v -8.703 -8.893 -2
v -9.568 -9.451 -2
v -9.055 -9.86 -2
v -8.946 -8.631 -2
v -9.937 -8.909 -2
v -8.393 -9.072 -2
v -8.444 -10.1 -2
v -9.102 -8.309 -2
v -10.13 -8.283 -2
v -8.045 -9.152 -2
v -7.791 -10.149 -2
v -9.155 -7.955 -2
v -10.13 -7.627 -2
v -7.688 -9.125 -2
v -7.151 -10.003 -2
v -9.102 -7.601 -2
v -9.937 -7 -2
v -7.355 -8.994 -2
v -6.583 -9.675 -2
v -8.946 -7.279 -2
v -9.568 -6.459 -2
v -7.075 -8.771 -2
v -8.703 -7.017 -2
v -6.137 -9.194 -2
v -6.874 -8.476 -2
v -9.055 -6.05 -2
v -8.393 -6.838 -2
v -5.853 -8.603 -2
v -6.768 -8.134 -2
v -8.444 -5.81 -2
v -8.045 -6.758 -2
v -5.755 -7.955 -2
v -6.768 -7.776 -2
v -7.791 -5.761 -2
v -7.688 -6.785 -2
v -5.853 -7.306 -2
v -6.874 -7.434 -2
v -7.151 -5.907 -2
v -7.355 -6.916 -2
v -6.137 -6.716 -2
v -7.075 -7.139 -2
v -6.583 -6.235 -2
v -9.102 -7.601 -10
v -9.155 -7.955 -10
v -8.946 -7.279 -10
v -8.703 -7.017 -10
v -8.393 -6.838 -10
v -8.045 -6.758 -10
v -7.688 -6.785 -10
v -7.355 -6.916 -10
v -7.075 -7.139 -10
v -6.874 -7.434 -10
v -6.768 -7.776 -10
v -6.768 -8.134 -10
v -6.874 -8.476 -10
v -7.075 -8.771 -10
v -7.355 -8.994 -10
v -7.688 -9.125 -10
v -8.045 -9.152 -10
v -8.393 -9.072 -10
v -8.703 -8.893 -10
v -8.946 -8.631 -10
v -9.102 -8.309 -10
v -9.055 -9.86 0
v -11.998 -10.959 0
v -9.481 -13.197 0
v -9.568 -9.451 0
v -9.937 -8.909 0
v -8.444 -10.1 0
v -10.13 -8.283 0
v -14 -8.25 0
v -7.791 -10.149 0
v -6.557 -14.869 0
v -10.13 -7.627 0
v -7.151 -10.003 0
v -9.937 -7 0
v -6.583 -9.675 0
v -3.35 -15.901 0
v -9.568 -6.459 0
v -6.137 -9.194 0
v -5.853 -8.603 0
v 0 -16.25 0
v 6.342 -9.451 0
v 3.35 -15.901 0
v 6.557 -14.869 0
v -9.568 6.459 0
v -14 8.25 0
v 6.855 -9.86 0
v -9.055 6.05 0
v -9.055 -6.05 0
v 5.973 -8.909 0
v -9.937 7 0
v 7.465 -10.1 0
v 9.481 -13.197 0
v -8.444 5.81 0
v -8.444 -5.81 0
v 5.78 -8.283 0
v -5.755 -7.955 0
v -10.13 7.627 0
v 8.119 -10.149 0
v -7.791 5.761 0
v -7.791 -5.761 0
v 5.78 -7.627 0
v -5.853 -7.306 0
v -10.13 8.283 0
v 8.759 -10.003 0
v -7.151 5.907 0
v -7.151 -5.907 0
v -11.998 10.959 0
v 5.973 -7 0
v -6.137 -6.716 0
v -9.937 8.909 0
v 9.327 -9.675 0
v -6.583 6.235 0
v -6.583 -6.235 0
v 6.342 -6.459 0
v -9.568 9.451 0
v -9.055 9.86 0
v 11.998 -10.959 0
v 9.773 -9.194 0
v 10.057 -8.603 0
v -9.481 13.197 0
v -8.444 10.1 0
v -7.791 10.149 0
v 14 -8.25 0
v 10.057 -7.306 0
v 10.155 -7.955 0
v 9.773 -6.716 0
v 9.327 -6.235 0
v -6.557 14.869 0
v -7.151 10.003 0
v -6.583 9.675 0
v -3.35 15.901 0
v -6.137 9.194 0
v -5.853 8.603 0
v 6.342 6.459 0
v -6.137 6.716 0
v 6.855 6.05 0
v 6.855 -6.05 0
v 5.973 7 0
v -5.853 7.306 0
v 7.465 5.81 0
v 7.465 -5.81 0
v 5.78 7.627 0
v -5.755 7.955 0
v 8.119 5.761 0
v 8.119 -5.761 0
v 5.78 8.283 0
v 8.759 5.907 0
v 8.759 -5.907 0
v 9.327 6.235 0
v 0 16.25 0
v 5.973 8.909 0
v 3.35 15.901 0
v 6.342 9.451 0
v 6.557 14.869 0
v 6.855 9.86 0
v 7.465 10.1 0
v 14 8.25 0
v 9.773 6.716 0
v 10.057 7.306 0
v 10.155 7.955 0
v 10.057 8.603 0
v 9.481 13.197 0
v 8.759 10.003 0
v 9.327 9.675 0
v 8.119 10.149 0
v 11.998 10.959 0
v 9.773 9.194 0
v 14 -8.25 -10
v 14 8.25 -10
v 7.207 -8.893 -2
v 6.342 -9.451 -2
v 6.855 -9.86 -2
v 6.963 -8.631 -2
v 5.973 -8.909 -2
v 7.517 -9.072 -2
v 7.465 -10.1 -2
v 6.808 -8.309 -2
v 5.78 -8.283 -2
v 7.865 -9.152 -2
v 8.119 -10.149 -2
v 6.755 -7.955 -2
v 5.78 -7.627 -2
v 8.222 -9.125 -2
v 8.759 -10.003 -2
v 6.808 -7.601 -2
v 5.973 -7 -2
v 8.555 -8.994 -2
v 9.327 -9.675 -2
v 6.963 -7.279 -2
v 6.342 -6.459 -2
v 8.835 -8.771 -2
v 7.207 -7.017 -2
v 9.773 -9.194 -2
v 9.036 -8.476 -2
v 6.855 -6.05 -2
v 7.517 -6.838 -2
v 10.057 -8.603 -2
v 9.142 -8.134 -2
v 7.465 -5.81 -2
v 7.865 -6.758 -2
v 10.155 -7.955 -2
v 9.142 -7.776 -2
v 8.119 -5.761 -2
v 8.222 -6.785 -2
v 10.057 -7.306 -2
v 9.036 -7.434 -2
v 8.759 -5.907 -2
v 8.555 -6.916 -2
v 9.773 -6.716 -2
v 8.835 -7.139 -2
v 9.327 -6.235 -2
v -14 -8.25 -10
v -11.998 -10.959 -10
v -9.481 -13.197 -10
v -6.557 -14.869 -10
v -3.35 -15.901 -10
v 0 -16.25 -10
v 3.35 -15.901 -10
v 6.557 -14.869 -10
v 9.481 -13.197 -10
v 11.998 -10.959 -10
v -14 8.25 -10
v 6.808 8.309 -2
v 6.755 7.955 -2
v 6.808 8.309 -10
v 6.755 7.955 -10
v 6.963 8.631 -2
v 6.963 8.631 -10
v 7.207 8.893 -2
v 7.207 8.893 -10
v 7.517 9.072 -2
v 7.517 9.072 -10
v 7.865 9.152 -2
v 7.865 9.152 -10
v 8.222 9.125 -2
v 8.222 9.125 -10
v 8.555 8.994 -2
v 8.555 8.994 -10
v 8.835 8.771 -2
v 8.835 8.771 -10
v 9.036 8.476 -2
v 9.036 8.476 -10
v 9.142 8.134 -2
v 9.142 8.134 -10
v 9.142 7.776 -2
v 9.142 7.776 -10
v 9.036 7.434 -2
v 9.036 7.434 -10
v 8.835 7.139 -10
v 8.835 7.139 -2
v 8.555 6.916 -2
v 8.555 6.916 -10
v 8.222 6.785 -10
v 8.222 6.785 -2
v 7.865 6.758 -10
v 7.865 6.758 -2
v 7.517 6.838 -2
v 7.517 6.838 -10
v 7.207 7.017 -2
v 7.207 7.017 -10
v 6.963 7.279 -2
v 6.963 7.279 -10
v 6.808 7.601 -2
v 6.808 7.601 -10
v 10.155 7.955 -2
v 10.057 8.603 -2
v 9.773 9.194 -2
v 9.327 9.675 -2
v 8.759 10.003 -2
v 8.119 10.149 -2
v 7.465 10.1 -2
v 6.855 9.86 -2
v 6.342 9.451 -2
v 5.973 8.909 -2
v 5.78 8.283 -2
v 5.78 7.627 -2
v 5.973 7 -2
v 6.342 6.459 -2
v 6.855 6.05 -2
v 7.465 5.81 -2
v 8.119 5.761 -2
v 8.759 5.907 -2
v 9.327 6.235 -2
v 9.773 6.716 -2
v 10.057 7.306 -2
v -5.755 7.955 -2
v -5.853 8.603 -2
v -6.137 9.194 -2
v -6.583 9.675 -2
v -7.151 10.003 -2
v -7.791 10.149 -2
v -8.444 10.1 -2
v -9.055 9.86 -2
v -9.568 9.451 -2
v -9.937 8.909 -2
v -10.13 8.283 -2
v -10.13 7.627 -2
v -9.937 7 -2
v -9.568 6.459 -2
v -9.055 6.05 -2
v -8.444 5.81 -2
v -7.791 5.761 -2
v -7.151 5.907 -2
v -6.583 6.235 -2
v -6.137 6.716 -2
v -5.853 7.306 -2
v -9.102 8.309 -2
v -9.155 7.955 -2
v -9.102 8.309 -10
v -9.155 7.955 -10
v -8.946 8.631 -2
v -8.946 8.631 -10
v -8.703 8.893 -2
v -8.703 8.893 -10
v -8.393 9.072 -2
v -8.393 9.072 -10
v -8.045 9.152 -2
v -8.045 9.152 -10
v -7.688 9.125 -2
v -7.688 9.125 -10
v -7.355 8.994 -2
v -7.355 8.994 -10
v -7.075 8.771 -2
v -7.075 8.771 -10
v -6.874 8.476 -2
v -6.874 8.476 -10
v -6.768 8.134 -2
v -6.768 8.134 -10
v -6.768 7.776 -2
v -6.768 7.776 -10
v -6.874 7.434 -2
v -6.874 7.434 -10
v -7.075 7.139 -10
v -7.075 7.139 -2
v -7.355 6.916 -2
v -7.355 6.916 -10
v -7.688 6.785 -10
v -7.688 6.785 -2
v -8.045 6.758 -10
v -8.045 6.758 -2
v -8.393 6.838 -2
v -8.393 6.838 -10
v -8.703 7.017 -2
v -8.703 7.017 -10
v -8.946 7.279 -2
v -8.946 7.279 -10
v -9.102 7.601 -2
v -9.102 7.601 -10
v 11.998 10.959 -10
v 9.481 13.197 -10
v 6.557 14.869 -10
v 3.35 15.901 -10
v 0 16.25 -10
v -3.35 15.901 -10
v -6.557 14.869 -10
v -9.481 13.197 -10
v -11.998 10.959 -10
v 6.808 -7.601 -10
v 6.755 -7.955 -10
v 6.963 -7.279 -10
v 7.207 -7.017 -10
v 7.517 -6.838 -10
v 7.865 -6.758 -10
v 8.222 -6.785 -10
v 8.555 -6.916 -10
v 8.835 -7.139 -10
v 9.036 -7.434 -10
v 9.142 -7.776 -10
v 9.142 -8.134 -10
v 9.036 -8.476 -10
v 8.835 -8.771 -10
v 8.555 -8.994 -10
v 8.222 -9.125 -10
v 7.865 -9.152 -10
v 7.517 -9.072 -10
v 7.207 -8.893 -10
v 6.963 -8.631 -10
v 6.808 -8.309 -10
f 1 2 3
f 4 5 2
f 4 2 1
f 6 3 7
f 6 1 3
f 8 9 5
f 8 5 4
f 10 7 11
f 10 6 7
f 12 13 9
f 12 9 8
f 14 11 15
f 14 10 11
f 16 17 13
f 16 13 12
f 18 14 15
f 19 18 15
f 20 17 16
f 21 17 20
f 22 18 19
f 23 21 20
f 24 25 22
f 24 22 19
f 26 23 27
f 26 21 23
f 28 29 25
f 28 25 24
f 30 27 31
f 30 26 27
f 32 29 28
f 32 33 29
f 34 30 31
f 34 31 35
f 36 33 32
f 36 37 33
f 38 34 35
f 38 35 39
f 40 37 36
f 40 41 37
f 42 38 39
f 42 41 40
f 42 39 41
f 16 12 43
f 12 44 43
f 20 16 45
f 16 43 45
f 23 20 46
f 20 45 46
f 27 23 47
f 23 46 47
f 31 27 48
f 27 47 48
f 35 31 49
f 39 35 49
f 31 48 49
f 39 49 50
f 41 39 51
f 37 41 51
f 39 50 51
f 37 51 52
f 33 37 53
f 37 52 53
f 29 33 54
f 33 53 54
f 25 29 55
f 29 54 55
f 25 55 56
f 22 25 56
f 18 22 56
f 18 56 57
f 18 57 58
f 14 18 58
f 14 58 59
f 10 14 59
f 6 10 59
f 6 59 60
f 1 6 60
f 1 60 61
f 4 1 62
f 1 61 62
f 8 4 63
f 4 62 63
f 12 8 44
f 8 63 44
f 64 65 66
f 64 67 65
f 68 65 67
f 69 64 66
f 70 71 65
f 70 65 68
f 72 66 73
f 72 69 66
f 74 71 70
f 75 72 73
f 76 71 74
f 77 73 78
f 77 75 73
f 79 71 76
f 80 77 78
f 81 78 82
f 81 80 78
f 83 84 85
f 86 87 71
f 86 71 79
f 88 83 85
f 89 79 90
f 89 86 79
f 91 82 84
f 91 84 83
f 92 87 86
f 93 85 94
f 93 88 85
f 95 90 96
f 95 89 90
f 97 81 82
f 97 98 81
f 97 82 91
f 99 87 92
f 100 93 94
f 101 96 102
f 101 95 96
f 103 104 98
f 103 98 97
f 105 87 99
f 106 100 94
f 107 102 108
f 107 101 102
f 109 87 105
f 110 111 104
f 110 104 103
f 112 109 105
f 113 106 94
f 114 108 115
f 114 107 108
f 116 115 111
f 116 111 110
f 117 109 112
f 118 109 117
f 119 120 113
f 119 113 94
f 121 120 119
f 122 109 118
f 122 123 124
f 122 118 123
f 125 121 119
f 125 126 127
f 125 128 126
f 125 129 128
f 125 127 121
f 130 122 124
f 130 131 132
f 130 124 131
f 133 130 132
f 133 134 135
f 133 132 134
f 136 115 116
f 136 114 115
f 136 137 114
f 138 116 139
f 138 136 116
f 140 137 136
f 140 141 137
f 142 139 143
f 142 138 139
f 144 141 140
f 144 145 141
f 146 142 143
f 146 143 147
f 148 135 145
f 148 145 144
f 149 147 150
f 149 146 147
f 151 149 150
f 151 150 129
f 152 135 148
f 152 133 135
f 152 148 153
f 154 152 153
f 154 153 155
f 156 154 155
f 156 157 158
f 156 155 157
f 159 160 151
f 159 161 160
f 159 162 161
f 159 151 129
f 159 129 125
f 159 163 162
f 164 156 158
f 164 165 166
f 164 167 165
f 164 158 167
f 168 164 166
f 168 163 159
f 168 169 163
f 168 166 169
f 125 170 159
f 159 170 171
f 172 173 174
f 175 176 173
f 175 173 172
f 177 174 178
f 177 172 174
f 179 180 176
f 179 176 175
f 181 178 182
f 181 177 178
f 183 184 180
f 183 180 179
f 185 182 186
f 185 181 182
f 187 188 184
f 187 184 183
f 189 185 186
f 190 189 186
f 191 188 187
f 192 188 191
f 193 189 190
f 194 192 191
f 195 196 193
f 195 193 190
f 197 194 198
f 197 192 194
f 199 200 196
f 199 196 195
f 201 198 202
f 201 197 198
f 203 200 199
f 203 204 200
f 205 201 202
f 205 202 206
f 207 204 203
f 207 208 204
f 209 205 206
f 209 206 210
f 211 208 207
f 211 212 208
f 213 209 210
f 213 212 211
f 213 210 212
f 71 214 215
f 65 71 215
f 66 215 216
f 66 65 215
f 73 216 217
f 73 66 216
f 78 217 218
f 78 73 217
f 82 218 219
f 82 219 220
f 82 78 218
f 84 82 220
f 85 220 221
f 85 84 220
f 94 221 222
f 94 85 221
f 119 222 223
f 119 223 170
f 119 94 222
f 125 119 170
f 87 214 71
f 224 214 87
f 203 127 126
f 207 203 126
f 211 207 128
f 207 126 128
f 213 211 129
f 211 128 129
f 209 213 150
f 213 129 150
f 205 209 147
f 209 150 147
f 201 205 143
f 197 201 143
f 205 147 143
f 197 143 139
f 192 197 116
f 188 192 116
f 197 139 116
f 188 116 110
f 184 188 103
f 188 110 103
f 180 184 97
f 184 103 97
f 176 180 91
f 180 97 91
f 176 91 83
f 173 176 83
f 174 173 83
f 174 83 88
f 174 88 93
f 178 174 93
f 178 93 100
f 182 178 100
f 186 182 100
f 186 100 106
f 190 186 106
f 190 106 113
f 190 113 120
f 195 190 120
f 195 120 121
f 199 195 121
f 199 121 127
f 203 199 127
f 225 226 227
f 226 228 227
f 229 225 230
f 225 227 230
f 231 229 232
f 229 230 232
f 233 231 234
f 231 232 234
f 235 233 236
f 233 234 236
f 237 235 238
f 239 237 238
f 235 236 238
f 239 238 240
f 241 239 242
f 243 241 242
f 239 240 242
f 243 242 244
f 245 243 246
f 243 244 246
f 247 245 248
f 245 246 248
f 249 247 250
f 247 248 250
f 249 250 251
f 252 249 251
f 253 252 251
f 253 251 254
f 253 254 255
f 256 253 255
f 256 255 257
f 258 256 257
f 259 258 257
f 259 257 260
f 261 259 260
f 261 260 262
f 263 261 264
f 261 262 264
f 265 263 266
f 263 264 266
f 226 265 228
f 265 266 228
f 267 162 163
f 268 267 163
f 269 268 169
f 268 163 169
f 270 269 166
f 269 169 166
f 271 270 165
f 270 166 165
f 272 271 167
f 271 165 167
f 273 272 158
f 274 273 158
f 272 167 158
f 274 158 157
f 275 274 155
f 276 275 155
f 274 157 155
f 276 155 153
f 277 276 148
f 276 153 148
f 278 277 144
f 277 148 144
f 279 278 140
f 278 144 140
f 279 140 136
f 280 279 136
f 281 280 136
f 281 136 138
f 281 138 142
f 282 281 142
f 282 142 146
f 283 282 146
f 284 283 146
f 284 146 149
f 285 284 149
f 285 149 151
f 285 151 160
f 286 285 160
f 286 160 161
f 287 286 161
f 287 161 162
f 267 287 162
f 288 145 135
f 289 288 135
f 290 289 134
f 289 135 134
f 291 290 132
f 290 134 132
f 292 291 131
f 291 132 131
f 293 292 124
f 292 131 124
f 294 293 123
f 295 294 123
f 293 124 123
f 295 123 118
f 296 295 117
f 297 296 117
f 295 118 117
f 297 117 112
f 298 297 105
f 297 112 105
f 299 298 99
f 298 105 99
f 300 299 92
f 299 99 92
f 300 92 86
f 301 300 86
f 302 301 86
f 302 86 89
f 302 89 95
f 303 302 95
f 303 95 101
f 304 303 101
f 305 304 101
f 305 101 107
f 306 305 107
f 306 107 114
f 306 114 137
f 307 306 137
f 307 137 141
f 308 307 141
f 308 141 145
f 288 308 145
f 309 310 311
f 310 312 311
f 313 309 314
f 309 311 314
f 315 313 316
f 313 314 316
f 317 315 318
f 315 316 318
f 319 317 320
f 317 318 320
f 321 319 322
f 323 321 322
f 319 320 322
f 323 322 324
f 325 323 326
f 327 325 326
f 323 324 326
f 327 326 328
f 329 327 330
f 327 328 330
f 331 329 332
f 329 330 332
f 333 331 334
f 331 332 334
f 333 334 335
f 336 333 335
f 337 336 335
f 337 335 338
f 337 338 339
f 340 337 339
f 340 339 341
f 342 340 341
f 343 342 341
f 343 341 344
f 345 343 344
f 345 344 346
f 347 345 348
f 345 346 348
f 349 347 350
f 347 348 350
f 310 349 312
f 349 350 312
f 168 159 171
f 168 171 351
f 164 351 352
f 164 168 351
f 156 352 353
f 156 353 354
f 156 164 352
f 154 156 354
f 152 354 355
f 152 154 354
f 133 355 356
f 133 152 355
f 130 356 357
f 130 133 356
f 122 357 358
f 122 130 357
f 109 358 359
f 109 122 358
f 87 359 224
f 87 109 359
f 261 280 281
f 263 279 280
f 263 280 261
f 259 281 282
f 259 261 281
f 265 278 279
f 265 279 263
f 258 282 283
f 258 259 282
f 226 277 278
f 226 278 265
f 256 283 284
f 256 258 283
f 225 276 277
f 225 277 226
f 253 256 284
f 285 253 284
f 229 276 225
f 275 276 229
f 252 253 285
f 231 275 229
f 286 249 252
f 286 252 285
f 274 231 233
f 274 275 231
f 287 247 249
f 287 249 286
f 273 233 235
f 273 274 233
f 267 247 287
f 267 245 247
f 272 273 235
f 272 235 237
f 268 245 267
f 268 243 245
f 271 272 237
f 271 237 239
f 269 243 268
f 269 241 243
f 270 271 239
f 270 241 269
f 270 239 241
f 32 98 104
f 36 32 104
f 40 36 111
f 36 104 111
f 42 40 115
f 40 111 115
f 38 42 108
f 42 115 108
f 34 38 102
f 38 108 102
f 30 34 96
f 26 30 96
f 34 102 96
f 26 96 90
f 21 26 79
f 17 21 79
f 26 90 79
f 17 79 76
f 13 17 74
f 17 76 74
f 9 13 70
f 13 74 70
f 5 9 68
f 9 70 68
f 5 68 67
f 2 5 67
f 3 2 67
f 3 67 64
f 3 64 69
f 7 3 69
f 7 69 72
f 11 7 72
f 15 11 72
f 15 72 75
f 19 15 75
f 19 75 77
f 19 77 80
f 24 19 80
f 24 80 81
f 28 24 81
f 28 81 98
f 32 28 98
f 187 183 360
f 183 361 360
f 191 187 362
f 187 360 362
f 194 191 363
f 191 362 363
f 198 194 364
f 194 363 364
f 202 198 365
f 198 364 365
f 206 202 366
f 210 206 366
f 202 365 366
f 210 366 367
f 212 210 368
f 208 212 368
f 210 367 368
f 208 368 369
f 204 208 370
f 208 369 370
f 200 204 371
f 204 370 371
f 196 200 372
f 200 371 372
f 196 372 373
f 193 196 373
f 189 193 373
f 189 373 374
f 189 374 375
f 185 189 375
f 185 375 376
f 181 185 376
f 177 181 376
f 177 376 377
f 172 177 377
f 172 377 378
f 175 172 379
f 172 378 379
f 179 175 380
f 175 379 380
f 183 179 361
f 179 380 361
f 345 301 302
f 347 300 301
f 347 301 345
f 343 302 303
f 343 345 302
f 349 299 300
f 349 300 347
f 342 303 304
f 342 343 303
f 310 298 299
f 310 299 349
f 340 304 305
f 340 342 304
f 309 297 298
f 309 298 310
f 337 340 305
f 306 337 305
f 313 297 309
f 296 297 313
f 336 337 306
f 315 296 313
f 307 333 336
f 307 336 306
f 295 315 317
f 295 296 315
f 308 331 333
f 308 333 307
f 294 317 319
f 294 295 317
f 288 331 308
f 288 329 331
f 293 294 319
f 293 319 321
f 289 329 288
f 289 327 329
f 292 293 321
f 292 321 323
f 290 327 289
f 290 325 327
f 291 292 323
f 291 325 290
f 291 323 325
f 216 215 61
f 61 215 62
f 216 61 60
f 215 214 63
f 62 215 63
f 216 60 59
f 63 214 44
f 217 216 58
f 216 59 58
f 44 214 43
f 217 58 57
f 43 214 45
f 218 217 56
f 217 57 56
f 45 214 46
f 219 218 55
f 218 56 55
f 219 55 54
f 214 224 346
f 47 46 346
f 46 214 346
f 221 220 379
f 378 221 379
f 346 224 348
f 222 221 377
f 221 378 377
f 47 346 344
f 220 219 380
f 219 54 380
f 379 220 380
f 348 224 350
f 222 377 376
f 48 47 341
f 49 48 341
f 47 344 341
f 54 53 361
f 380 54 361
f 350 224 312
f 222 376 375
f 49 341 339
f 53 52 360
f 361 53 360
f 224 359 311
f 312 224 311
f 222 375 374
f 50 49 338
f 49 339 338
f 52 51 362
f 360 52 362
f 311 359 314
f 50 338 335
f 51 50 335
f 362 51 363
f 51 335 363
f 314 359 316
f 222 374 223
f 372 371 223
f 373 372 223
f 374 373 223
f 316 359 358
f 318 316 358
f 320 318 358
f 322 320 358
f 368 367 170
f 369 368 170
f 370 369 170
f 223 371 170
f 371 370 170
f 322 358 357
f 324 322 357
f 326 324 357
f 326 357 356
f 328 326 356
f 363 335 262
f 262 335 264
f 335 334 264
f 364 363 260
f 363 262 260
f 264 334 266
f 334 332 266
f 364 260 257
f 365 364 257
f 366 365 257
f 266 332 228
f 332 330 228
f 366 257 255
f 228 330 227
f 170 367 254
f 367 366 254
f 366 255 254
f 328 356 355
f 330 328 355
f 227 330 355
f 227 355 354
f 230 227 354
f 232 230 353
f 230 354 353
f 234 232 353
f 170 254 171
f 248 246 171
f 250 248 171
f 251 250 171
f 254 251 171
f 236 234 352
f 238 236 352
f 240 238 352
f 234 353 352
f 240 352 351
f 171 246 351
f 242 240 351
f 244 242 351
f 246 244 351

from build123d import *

# Parameters (mm, degrees)
SKETCH1_R                      = 16.25
BOSS_EXTRUDE1_DEPTH            = 10
CUT_EXTRUDE1_DEPTH             = 26.06242207
CUT_EXTRUDE1_DEPTH_BACK        = 26.06242207
SKETCH2_W                      = 10
SKETCH2_H                      = 16.5
CBORE_FOR_M2_SHCS1_D           = 2.4
CBORE_FOR_M2_SHCS1_CBORE_D     = 4.4
CBORE_FOR_M2_SHCS1_CBORE_DEPTH = 2


with BuildPart() as part:
    # Sketch1 → Boss-Extrude1 (new body)
    with BuildSketch(Plane.XY):
        Circle(SKETCH1_R)
    extrude(amount=-BOSS_EXTRUDE1_DEPTH)

    # Sketch2 → Cut-Extrude1 (cut, two sides: drawn at the far end of the back side and taken through both)
    with BuildSketch(Plane.XY.offset(-CUT_EXTRUDE1_DEPTH_BACK)):
        with Locations((19, 0)):
            Rectangle(SKETCH2_W, SKETCH2_H)
        with Locations((-19, 0)):
            Rectangle(SKETCH2_W, SKETCH2_H)
    extrude(amount=CUT_EXTRUDE1_DEPTH + CUT_EXTRUDE1_DEPTH_BACK, mode=Mode.SUBTRACT)

    # CBORE for M2 SHCS1 (through all)
    with Locations(Plane.XY):
        with Locations((-7.954951288, 7.954951288), (7.954951288, 7.954951288), (7.954951288, -7.954951288), (-7.954951288, -7.954951288)):
            CounterBoreHole(CBORE_FOR_M2_SHCS1_D / 2, CBORE_FOR_M2_SHCS1_CBORE_D / 2, CBORE_FOR_M2_SHCS1_CBORE_DEPTH)


solid = part.part
